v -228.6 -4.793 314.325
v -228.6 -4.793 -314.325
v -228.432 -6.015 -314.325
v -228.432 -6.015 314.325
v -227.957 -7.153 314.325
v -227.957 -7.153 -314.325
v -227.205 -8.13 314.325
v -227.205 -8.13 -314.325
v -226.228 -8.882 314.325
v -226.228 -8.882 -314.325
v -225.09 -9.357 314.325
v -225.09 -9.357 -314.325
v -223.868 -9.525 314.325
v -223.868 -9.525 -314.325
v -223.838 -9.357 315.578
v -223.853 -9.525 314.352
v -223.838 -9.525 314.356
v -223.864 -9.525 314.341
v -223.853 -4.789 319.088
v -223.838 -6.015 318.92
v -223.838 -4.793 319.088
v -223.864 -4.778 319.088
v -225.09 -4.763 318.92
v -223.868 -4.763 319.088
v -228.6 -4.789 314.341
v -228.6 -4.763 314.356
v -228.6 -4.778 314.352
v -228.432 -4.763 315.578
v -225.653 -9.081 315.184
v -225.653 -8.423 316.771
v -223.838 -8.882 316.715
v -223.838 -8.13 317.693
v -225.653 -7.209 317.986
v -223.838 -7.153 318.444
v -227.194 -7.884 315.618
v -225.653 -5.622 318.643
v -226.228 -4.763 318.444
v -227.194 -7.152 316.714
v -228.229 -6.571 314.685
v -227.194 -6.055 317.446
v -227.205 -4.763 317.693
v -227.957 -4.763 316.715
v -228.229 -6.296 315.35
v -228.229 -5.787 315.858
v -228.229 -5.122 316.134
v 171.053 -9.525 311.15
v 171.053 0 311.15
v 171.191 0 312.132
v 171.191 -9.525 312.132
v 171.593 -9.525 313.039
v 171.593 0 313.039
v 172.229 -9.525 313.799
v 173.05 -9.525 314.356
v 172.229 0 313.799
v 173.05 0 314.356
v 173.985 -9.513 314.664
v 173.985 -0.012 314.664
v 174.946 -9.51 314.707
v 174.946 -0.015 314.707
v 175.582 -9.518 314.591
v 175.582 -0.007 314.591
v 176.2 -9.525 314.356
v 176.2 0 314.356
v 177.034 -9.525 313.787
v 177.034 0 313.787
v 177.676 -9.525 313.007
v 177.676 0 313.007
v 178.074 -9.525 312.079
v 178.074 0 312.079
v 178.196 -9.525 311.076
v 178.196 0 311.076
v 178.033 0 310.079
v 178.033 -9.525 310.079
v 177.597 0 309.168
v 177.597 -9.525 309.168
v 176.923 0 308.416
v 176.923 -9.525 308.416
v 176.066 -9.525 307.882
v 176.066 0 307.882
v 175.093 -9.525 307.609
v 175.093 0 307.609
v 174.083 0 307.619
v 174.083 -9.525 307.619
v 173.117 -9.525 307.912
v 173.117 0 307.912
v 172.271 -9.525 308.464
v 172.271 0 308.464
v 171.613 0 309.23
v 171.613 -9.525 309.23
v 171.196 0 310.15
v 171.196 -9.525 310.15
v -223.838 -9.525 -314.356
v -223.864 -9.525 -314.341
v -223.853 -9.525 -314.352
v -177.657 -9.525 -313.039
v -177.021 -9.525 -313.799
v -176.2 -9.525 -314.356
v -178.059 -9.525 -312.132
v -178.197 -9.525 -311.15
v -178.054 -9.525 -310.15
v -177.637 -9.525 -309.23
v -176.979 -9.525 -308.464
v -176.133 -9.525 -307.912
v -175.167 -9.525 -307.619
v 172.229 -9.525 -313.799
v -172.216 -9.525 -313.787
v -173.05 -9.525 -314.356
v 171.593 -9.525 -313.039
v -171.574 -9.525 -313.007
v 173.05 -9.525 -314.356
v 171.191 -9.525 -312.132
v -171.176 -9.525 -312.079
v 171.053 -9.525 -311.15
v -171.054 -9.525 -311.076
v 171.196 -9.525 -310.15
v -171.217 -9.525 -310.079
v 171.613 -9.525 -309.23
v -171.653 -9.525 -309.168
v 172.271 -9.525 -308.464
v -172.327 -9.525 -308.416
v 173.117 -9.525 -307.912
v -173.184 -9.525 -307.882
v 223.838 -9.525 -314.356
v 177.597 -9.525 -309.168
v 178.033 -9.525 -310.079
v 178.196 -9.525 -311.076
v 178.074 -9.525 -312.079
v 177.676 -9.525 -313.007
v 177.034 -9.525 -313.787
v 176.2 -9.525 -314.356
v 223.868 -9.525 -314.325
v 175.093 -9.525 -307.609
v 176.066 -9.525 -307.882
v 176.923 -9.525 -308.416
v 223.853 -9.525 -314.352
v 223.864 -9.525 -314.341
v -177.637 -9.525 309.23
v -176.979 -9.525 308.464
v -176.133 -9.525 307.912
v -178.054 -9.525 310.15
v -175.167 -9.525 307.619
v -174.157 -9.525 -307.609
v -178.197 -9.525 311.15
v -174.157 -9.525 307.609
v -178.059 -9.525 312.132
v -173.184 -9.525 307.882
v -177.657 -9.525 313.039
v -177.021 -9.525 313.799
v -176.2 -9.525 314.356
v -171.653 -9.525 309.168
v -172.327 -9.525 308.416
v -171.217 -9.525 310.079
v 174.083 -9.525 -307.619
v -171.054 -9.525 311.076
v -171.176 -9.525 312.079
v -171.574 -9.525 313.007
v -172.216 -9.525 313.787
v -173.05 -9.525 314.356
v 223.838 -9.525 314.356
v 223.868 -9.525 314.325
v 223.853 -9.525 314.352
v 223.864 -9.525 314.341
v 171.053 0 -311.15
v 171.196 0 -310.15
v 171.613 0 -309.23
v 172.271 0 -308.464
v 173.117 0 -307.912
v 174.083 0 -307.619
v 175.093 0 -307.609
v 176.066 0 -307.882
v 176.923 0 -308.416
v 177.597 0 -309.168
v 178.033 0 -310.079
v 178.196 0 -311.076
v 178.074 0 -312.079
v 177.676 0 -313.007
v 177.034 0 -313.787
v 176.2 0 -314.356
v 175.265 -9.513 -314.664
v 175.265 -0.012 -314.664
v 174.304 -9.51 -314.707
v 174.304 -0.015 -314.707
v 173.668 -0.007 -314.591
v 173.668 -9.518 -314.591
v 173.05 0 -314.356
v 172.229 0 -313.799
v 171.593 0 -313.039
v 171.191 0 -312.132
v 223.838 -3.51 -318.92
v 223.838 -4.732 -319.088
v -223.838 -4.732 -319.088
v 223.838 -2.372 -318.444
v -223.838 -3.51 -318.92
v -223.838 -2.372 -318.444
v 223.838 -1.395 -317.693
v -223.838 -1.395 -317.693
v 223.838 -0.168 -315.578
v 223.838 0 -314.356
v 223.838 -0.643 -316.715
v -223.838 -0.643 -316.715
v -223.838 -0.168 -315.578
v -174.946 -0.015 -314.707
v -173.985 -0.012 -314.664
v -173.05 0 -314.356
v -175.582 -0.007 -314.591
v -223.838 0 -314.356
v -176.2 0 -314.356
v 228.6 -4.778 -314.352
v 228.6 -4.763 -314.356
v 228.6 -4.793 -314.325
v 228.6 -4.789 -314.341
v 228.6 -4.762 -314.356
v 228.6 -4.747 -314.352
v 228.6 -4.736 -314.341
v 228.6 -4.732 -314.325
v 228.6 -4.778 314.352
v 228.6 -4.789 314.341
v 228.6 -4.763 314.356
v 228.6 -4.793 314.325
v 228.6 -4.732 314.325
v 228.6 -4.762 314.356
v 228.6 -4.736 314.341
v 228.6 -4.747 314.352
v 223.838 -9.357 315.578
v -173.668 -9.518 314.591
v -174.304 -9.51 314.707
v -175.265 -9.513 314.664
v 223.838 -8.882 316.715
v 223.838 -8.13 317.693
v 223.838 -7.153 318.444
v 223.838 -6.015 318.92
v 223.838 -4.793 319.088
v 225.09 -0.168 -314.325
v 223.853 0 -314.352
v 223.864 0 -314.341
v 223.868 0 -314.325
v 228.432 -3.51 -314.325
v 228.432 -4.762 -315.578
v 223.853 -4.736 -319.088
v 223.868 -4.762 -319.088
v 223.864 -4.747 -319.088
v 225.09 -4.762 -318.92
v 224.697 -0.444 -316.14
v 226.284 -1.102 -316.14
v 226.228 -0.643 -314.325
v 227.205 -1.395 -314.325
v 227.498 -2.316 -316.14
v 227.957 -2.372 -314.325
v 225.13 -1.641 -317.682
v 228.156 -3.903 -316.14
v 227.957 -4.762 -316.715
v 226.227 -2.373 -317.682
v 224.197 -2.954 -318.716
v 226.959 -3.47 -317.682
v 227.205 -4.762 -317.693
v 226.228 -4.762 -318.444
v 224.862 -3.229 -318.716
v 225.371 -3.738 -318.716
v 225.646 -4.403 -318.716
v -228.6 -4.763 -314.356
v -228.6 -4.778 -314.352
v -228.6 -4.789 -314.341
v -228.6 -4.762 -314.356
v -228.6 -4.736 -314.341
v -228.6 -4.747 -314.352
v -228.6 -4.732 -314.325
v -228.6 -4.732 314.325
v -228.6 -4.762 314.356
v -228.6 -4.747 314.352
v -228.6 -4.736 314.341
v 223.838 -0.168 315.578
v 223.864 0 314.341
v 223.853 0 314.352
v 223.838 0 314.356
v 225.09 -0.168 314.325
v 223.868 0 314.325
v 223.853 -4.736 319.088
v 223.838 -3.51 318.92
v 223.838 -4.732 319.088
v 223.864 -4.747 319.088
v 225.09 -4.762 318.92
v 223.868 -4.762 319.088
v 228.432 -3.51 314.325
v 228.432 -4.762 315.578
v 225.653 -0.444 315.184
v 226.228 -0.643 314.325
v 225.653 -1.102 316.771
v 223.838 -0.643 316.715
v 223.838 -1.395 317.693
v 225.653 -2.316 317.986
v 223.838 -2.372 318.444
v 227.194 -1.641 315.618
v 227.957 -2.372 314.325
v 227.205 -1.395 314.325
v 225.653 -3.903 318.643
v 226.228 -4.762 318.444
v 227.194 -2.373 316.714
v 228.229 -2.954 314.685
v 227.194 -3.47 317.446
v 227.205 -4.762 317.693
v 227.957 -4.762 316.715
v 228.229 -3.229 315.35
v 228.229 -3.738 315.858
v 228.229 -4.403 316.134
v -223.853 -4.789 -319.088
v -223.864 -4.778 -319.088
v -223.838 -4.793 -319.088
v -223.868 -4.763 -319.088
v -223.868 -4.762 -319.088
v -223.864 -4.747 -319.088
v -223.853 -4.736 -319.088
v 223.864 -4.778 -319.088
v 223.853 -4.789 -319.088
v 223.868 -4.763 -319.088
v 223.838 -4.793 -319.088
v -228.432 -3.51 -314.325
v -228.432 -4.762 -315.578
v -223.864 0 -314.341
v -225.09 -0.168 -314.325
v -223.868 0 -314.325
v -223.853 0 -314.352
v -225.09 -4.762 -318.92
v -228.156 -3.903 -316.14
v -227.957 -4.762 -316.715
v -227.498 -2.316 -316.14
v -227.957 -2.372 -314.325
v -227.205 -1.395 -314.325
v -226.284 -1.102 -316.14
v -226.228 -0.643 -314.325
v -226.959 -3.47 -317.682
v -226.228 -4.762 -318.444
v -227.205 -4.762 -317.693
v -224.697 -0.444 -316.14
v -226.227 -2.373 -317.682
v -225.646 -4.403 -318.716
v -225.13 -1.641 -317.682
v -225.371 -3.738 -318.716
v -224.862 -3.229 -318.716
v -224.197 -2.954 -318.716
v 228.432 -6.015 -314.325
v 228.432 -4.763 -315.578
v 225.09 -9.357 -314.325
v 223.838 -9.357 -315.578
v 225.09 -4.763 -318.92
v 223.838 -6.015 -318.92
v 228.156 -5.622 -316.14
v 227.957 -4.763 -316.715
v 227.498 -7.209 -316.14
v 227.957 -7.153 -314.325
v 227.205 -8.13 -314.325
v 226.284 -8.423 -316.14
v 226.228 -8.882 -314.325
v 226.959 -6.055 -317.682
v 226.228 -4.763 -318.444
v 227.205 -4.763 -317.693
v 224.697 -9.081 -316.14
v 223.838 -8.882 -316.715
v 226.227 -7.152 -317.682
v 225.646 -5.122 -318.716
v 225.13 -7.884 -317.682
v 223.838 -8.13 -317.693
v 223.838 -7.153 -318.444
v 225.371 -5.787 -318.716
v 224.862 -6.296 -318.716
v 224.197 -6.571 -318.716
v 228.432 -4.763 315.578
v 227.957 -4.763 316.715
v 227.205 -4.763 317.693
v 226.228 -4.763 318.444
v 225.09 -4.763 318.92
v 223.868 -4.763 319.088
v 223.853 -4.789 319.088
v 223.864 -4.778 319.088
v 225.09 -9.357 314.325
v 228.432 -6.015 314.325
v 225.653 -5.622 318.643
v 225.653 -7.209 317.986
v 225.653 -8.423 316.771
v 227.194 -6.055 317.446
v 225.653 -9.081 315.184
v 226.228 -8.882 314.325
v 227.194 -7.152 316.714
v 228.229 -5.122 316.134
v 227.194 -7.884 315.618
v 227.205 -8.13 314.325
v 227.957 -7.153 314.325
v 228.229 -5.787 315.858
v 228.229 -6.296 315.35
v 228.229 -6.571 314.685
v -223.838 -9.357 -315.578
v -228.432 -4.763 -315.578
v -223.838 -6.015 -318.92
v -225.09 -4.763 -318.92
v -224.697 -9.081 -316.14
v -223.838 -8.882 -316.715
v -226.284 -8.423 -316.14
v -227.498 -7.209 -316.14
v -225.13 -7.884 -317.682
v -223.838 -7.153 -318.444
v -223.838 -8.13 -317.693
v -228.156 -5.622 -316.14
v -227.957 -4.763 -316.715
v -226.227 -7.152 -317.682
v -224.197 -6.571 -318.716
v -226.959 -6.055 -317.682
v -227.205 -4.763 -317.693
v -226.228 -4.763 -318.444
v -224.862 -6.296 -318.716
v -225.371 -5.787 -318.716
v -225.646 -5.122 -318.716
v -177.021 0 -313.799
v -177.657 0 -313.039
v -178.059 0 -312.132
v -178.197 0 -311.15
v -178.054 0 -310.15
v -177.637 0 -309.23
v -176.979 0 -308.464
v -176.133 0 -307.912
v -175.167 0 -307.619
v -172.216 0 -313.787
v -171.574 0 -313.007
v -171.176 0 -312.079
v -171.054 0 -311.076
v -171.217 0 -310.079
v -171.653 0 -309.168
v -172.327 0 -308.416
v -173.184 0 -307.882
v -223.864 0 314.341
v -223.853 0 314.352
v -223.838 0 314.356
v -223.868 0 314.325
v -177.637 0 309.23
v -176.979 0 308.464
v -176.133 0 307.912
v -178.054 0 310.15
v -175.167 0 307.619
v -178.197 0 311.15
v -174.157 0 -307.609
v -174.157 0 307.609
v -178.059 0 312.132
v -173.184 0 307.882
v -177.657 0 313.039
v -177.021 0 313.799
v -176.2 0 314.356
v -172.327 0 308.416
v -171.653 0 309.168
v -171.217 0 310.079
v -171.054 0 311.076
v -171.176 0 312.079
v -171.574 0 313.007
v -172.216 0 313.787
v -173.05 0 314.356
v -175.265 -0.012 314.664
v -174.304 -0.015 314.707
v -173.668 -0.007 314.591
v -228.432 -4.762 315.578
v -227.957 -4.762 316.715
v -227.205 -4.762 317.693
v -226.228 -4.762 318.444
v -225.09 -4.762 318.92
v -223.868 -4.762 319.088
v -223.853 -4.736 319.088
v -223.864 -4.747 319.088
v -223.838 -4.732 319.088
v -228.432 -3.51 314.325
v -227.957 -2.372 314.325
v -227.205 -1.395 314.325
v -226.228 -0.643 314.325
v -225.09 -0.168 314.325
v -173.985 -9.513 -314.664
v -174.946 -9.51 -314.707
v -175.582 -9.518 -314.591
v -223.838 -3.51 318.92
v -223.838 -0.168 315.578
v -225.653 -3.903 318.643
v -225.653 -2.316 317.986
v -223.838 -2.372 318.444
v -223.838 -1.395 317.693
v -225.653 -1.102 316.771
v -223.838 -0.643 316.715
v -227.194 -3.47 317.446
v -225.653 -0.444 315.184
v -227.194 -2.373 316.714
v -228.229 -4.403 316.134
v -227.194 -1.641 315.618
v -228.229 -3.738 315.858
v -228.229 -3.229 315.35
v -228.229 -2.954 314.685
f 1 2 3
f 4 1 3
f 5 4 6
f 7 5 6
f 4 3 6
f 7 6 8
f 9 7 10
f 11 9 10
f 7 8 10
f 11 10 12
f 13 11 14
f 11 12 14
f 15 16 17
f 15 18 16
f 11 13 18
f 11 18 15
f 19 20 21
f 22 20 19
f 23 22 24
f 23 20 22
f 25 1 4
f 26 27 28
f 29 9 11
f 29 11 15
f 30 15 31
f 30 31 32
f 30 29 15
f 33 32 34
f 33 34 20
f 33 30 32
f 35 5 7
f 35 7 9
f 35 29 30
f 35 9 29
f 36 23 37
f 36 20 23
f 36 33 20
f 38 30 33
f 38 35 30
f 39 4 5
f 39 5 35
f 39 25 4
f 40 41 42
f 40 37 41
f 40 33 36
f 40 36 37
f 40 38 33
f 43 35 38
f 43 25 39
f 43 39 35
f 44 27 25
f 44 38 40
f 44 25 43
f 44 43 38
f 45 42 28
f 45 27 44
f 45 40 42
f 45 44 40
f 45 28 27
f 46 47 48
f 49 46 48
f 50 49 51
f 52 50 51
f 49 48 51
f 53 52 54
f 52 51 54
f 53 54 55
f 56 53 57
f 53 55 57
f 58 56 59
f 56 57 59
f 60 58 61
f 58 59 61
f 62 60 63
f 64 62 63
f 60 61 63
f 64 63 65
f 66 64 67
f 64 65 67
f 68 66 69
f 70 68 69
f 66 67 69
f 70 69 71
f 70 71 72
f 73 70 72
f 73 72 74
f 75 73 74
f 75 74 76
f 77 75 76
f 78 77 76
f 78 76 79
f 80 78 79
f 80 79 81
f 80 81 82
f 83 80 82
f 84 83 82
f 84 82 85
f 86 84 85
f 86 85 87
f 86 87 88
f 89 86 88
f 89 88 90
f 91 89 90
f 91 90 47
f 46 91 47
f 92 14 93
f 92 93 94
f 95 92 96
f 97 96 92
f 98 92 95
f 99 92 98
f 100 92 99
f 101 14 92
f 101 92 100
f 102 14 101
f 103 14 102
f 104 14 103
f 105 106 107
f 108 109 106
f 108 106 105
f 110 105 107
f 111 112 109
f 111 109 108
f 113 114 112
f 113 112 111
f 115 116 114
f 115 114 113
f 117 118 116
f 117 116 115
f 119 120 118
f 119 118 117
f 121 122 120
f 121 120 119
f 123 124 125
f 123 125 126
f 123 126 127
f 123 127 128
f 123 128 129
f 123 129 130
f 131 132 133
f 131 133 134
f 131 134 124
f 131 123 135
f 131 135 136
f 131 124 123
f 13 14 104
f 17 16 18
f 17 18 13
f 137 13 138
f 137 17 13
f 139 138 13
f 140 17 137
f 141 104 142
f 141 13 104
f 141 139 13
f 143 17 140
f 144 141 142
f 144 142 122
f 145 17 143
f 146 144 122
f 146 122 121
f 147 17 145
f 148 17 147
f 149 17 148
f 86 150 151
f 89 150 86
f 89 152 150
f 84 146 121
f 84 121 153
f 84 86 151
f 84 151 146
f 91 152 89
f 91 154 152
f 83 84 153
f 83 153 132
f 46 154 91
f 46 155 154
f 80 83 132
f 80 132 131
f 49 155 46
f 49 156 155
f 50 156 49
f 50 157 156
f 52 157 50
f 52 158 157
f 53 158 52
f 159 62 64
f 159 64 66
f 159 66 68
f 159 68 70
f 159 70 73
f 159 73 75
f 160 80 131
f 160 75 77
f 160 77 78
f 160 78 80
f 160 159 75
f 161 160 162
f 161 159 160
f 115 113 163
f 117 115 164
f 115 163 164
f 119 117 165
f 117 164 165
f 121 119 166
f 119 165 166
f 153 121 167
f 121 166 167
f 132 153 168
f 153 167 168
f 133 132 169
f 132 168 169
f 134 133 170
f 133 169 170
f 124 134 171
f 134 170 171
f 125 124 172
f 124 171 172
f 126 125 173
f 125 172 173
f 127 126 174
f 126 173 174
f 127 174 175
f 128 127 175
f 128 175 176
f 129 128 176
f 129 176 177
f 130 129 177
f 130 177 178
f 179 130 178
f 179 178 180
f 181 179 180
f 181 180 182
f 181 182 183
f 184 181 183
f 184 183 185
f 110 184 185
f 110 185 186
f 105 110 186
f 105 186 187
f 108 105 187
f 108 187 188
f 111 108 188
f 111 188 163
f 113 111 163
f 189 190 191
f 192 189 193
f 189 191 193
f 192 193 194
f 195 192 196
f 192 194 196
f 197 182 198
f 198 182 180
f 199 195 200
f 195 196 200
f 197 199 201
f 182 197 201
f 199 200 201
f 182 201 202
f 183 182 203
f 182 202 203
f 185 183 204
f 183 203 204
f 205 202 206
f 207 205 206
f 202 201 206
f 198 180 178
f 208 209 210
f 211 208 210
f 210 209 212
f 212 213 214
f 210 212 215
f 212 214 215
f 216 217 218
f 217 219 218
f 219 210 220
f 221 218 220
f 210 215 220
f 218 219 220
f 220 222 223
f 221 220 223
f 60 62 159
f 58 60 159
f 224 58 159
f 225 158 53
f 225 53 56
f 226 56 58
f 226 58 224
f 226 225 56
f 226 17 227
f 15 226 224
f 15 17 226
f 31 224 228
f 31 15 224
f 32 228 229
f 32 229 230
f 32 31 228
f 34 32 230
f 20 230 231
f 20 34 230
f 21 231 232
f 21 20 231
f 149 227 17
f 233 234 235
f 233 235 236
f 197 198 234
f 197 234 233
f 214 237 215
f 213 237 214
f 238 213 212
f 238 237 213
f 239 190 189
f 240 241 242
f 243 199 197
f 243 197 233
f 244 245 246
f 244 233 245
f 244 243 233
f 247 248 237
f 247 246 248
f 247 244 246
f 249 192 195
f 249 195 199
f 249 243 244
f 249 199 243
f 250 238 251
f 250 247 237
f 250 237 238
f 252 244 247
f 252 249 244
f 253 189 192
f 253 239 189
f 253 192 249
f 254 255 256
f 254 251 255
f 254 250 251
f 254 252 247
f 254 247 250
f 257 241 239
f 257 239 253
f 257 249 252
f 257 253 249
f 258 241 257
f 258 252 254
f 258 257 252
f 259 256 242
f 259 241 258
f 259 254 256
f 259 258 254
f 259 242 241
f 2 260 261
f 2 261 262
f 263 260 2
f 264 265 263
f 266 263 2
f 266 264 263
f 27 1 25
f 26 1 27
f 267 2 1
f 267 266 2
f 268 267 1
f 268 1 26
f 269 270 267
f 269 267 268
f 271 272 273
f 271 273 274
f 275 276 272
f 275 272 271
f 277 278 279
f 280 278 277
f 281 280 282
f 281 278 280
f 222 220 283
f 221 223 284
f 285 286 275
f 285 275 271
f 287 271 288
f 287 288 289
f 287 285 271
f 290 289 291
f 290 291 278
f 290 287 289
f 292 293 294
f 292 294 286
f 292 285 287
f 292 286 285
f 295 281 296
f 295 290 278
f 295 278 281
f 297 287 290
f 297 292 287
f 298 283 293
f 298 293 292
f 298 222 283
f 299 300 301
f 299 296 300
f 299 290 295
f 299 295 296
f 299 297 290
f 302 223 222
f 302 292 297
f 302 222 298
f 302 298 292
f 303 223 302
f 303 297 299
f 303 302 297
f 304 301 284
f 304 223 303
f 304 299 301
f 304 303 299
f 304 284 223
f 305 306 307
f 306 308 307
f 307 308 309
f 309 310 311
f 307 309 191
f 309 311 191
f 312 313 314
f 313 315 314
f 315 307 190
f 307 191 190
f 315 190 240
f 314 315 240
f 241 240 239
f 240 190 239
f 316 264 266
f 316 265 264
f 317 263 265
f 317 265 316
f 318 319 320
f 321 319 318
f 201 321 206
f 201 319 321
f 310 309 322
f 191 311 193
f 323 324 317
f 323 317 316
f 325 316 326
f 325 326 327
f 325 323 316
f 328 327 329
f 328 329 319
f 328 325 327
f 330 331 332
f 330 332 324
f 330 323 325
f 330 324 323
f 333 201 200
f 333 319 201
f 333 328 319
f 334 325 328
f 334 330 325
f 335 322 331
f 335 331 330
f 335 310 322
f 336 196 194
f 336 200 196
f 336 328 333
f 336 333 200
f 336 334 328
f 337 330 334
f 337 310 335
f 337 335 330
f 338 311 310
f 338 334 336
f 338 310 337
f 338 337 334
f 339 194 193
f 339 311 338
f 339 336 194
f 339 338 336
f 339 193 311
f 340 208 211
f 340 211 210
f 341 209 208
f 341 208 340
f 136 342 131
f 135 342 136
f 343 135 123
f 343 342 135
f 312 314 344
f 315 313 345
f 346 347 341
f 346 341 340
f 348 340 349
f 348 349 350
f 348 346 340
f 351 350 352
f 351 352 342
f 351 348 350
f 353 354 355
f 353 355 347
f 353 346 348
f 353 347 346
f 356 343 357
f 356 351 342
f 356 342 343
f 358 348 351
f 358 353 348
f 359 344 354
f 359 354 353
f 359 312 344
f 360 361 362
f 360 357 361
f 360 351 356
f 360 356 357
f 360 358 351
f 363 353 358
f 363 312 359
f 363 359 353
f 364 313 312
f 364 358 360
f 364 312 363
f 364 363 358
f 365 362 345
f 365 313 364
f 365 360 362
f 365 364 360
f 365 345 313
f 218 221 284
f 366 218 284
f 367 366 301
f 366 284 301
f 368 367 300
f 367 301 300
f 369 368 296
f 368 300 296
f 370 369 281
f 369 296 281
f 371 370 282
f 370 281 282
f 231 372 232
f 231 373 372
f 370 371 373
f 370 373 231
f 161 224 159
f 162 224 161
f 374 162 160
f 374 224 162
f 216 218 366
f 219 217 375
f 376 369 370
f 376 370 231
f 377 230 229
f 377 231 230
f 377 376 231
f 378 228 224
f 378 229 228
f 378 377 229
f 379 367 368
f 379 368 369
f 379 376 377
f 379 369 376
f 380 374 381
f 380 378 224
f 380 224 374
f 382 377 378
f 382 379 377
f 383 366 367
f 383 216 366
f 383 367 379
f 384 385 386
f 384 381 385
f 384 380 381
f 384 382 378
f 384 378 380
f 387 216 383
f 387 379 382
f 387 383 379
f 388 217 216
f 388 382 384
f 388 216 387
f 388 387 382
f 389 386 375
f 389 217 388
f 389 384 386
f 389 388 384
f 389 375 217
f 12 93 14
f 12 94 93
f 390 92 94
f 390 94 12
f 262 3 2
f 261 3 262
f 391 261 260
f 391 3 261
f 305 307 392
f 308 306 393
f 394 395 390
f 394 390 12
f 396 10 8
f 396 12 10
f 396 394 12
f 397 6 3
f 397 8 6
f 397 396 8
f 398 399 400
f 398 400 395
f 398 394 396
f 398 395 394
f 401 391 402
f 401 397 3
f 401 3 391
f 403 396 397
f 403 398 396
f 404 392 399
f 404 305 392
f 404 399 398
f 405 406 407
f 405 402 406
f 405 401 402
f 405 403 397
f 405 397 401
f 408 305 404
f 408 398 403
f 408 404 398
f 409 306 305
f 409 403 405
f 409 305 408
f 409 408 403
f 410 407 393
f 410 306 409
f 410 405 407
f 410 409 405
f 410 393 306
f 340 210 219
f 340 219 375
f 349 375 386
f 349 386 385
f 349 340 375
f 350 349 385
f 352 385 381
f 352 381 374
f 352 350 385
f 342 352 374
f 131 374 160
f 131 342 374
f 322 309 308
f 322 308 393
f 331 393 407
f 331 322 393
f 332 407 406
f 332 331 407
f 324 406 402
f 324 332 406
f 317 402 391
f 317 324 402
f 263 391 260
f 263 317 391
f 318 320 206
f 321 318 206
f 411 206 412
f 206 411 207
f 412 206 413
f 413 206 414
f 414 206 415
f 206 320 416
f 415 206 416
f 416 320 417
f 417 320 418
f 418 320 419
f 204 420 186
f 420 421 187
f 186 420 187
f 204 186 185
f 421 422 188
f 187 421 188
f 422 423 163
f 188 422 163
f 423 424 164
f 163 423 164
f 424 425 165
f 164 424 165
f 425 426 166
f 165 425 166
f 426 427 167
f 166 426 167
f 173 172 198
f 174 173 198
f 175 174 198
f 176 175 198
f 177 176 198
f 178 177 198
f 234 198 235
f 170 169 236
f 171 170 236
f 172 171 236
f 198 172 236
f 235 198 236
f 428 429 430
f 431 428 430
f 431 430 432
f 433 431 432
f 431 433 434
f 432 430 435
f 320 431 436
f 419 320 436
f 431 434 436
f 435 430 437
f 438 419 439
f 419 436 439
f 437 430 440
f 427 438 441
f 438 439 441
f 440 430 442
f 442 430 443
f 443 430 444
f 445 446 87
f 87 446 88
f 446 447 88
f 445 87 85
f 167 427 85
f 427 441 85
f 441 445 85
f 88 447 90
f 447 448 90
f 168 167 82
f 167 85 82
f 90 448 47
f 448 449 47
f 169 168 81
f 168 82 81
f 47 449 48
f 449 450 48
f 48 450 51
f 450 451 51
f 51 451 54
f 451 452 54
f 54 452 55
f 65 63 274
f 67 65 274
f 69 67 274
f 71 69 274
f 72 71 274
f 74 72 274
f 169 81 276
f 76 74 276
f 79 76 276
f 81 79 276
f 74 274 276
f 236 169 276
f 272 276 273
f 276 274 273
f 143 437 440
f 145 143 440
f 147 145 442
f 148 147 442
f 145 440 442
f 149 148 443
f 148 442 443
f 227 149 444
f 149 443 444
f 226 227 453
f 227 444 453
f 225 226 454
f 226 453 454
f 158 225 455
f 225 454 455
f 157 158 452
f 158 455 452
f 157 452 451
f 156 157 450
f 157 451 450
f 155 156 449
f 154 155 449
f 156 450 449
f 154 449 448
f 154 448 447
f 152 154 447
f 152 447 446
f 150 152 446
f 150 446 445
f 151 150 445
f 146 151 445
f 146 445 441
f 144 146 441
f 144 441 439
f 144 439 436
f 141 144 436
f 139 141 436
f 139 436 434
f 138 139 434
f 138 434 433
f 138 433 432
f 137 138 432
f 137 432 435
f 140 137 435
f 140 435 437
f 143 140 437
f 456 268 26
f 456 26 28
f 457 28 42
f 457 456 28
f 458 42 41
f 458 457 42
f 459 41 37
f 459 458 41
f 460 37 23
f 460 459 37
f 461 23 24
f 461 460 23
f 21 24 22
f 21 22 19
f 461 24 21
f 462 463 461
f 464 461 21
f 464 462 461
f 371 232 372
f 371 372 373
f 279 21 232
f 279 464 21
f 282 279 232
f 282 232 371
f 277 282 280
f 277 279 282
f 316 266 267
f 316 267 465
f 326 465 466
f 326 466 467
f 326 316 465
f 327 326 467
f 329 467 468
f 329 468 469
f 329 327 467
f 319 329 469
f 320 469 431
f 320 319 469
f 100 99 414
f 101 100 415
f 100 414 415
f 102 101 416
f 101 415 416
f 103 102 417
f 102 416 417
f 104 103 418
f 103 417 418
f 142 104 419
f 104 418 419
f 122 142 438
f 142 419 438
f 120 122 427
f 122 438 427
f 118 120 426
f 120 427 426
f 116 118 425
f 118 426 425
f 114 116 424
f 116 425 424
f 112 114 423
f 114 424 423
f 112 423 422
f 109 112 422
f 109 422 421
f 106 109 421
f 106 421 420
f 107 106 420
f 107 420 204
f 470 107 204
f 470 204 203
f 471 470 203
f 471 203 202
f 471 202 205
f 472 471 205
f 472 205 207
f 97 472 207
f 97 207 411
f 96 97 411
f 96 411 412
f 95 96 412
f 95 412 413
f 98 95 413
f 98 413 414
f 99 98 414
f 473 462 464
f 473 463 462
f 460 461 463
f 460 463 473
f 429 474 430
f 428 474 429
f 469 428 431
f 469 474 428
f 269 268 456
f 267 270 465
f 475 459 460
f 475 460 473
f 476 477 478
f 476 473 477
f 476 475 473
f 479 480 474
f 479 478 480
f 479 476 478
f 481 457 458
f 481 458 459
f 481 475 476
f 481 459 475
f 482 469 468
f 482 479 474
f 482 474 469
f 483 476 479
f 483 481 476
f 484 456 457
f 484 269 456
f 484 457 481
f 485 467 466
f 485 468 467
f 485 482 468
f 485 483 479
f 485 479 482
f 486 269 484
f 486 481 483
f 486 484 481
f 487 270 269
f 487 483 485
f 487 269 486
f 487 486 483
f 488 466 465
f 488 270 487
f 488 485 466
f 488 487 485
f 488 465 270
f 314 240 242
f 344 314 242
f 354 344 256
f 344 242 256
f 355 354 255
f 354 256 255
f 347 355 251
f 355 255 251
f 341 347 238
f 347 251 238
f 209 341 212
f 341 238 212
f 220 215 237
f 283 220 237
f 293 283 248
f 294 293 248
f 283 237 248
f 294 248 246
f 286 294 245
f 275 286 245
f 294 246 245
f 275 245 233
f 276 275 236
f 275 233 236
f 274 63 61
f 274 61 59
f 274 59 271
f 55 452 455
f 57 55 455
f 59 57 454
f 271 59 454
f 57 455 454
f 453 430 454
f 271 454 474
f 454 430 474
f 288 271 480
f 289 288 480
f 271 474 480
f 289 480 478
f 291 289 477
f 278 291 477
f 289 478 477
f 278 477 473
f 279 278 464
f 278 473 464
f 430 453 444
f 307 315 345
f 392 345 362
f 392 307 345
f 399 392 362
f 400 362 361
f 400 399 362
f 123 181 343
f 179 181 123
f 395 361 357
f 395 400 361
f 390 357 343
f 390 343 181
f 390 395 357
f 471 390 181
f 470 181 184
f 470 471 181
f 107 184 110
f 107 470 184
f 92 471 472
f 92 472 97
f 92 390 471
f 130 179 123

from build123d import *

# Parameters (mm, degrees)
F0_W         = 457.2
F0_H         = 638.175
F1_DEPTH     = 9.525
F3_D         = 7.14375
F4_T1_DEPTH  = 628.6502
F4_T3_DEPTH  = 447.6752
F4_T5_DEPTH  = 0.0002
F4_S9_W      = 4.85775
F4_S9_H      = 4.85775
F4_T10_DEPTH = 4.85775
F4_S15_W     = 4.85775
F4_S15_H     = 4.85775
F4_T16_DEPTH = 4.85775
F4_S21_W     = 4.85775
F4_S21_H     = 4.85775
F4_T22_DEPTH = 4.85775
F4_S27_W     = 4.85775
F4_S27_H     = 4.85775
F4_T28_DEPTH = 4.85775
F4_S33_W     = 4.85775
F4_S33_H     = 4.85775
F4_T34_DEPTH = 4.85775
F4_S39_W     = 4.85775
F4_S39_H     = 4.85775
F4_T40_DEPTH = 4.85775
F4_S45_W     = 4.85775
F4_S45_H     = 4.85775
F4_T46_DEPTH = 4.85775
F4_S51_W     = 4.85775
F4_S51_H     = 4.85775
F4_T52_DEPTH = 4.85775


# Not quite as in the source:
# - a fillet or chamfer that OpenCascade refuses, or shapes differently, is made with other operations: its cross-section is extruded or revolved along the edge and cut away or added


with BuildPart() as f1:
    # F0 (on Front) → F1 (new body)
    with BuildSketch(Plane.XZ):
        Rectangle(F0_W, F0_H)
    extrude(amount=F1_DEPTH)

    # F3 (through all)
    with Locations(Plane.XZ.offset(9.525)):
        with Locations((-174.625, 311.15), (174.625, 311.15), (-174.625, -311.15), (174.625, -311.15)):
            Hole(F3_D / 2)

    # F4: fillet of radius 4.7625 on 12 edges, made by hand

    # F4_s2 → F4_t1 (cut)
    with BuildSketch(Plane.XY.offset(-314.3251)):
        with BuildLine():
            ThreePointArc((-228.6001, -4.7626), (-227.2051960454, -8.1301960454), (-223.8376, -9.5251))
            Line((-223.8376, -9.5251), (-223.8376, -9.62035))
            ThreePointArc((-223.8376, -9.62035), (-226.2188, -9.62025), (-228.6, -9.62025))
            Line((-228.6, -9.62025), (-228.69525, -9.525))
            ThreePointArc((-228.69525, -9.525), (-228.69525, -7.1438), (-228.69535, -4.7626))
            Line((-228.69535, -4.7626), (-228.6001, -4.7626))
        make_face()
        with BuildLine():
            ThreePointArc((228.6001, -4.7626), (227.2051960454, -8.1301960454), (223.8376, -9.5251))
            Line((223.8376, -9.5251), (223.8376, -9.62035))
            ThreePointArc((223.8376, -9.62035), (226.2188, -9.62025), (228.6, -9.62025))
            Line((228.6, -9.62025), (228.69525, -9.525))
            ThreePointArc((228.69525, -9.525), (228.69525, -7.1438), (228.69535, -4.7626))
            Line((228.69535, -4.7626), (228.6001, -4.7626))
        make_face()
        with BuildLine():
            ThreePointArc((228.6001, -4.7624), (227.2051960454, -1.3948039546), (223.8376, 0.0001))
            Line((223.8376, 0.0001), (223.8376, 0.09535))
            ThreePointArc((223.8376, 0.09535), (226.2188, 0.09525), (228.6, 0.09525))
            Line((228.6, 0.09525), (228.69525, 0))
            ThreePointArc((228.69525, 0), (228.69525, -2.3812), (228.69535, -4.7624))
            Line((228.69535, -4.7624), (228.6001, -4.7624))
        make_face()
        with BuildLine():
            ThreePointArc((-228.6001, -4.7624), (-227.2051960454, -1.3948039546), (-223.8376, 0.0001))
            Line((-223.8376, 0.0001), (-223.8376, 0.09535))
            ThreePointArc((-223.8376, 0.09535), (-226.2188, 0.09525), (-228.6, 0.09525))
            Line((-228.6, 0.09525), (-228.69525, 0))
            ThreePointArc((-228.69525, 0), (-228.69525, -2.3812), (-228.69535, -4.7624))
            Line((-228.69535, -4.7624), (-228.6001, -4.7624))
        make_face()
    extrude(amount=F4_T1_DEPTH, mode=Mode.SUBTRACT)

    # F4_s4 → F4_t3 (cut)
    with BuildSketch(Plane.YZ.offset(-223.8376)):
        with BuildLine():
            ThreePointArc((-4.7626, -319.0876), (-8.1301960454, -317.6926960454), (-9.5251, -314.3251))
            Line((-9.5251, -314.3251), (-9.62035, -314.3251))
            ThreePointArc((-9.62035, -314.3251), (-9.62025, -316.7063), (-9.62025, -319.0875))
            Line((-9.62025, -319.0875), (-9.525, -319.18275))
            ThreePointArc((-9.525, -319.18275), (-7.1438, -319.18275), (-4.7626, -319.18285))
            Line((-4.7626, -319.18285), (-4.7626, -319.0876))
        make_face()
        with BuildLine():
            ThreePointArc((-9.5251, 314.3251), (-8.1301960454, 317.6926960454), (-4.7626, 319.0876))
            Line((-4.7626, 319.0876), (-4.7626, 319.18285))
            ThreePointArc((-4.7626, 319.18285), (-7.1438, 319.18275), (-9.525, 319.18275))
            Line((-9.525, 319.18275), (-9.62025, 319.0875))
            ThreePointArc((-9.62025, 319.0875), (-9.62025, 316.7063), (-9.62035, 314.3251))
            Line((-9.62035, 314.3251), (-9.5251, 314.3251))
        make_face()
        with BuildLine():
            ThreePointArc((0.0001, 314.3251), (-1.3948039546, 317.6926960454), (-4.7624, 319.0876))
            Line((-4.7624, 319.0876), (-4.7624, 319.18285))
            ThreePointArc((-4.7624, 319.18285), (-2.3812, 319.18275), (0, 319.18275))
            Line((0, 319.18275), (0.09525, 319.0875))
            ThreePointArc((0.09525, 319.0875), (0.09525, 316.7063), (0.09535, 314.3251))
            Line((0.09535, 314.3251), (0.0001, 314.3251))
        make_face()
        with BuildLine():
            ThreePointArc((-4.7624, -319.0876), (-1.3948039546, -317.6926960454), (0.0001, -314.3251))
            Line((0.0001, -314.3251), (0.09535, -314.3251))
            ThreePointArc((0.09535, -314.3251), (0.09525, -316.7063), (0.09525, -319.0875))
            Line((0.09525, -319.0875), (0, -319.18275))
            ThreePointArc((0, -319.18275), (-2.3812, -319.18275), (-4.7624, -319.18285))
            Line((-4.7624, -319.18285), (-4.7624, -319.0876))
        make_face()
    extrude(amount=F4_T3_DEPTH, mode=Mode.SUBTRACT)

    # F4_s6 → F4_t5 (cut)
    with BuildSketch(Plane.XZ.offset(4.7624)):
        with BuildLine():
            ThreePointArc((-223.8376, -319.0876), (-227.2051960454, -317.6926960454), (-228.6001, -314.3251))
            Line((-228.6001, -314.3251), (-228.69535, -314.3251))
            ThreePointArc((-228.69535, -314.3251), (-228.69525, -316.7063), (-228.69525, -319.0875))
            Line((-228.69525, -319.0875), (-228.6, -319.18275))
            ThreePointArc((-228.6, -319.18275), (-226.2188, -319.18275), (-223.8376, -319.18285))
            Line((-223.8376, -319.18285), (-223.8376, -319.0876))
        make_face()
        with BuildLine():
            ThreePointArc((223.8376, -319.0876), (227.2051960454, -317.6926960454), (228.6001, -314.3251))
            Line((228.6001, -314.3251), (228.69535, -314.3251))
            ThreePointArc((228.69535, -314.3251), (228.69525, -316.7063), (228.69525, -319.0875))
            Line((228.69525, -319.0875), (228.6, -319.18275))
            ThreePointArc((228.6, -319.18275), (226.2188, -319.18275), (223.8376, -319.18285))
            Line((223.8376, -319.18285), (223.8376, -319.0876))
        make_face()
        with BuildLine():
            ThreePointArc((228.6001, 314.3251), (227.2051960454, 317.6926960454), (223.8376, 319.0876))
            Line((223.8376, 319.0876), (223.8376, 319.18285))
            ThreePointArc((223.8376, 319.18285), (226.2188, 319.18275), (228.6, 319.18275))
            Line((228.6, 319.18275), (228.69525, 319.0875))
            ThreePointArc((228.69525, 319.0875), (228.69525, 316.7063), (228.69535, 314.3251))
            Line((228.69535, 314.3251), (228.6001, 314.3251))
        make_face()
        with BuildLine():
            ThreePointArc((-228.6001, 314.3251), (-227.2051960454, 317.6926960454), (-223.8376, 319.0876))
            Line((-223.8376, 319.0876), (-223.8376, 319.18285))
            ThreePointArc((-223.8376, 319.18285), (-226.2188, 319.18275), (-228.6, 319.18275))
            Line((-228.6, 319.18275), (-228.69525, 319.0875))
            ThreePointArc((-228.69525, 319.0875), (-228.69525, 316.7063), (-228.69535, 314.3251))
            Line((-228.69535, 314.3251), (-228.6001, 314.3251))
        make_face()
    extrude(amount=F4_T5_DEPTH, mode=Mode.SUBTRACT)


with BuildPart() as f4_tool8:
    # F4_s9 → F4_t10 (new body)
    with BuildSketch(Plane.YZ.offset(-223.8376)):
        with Locations((-7.191475, 316.753975)):
            Rectangle(F4_S9_W, F4_S9_H)
    extrude(amount=-F4_T10_DEPTH)

    # F4_s11 → F4_t12 (revolve, cut)
    with BuildSketch(Plane(origin=(-223.8376, -4.7626, 314.3251), x_dir=(0, 0.7071067812, -0.7071067812), z_dir=(0, 0.7071067812, 0.7071067812))):
        with BuildLine():
            ThreePointArc((0, -4.7625), (4.7625, 0), (0, 4.7625))
            Line((0, 4.7625), (0, -4.7625))
        make_face()
    revolve(axis=Axis((-223.8376, -4.7626, 314.3251), (-1, 0, 0)), mode=Mode.SUBTRACT)


with BuildPart() as f1_1:
    add(f1.part)

    # F4_t7: cut F4_tool8
    add(f4_tool8.part, mode=Mode.SUBTRACT)


with BuildPart() as f4_tool14:
    # F4_s15 → F4_t16 (new body)
    with BuildSketch(Plane.XY.offset(-314.3251)):
        with Locations((-226.266475, -7.191475)):
            Rectangle(F4_S15_W, F4_S15_H)
    extrude(amount=-F4_T16_DEPTH)

    # F4_s17 → F4_t18 (revolve, cut)
    with BuildSketch(Plane(origin=(-223.8376, -4.7626, -314.3251), x_dir=(0.7071067812, 0.7071067812, 0), z_dir=(-0.7071067812, 0.7071067812, 0))):
        with BuildLine():
            ThreePointArc((0, -4.7625), (4.7625, 0), (0, 4.7625))
            Line((0, 4.7625), (0, -4.7625))
        make_face()
    revolve(axis=Axis((-223.8376, -4.7626, -314.3251), (0, 0, -1)), mode=Mode.SUBTRACT)


with BuildPart() as f1_2:
    add(f1_1.part)

    # F4_t13: cut F4_tool14
    add(f4_tool14.part, mode=Mode.SUBTRACT)


with BuildPart() as f4_tool20:
    # F4_s21 → F4_t22 (new body)
    with BuildSketch(Plane.XY.offset(-314.3251)):
        with Locations((226.266475, -7.191475)):
            Rectangle(F4_S21_W, F4_S21_H)
    extrude(amount=-F4_T22_DEPTH)

    # F4_s23 → F4_t24 (revolve, cut)
    with BuildSketch(Plane(origin=(223.8376, -4.7626, -314.3251), x_dir=(-0.7071067812, 0.7071067812, 0), z_dir=(-0.7071067812, -0.7071067812, 0))):
        with BuildLine():
            ThreePointArc((0, -4.7625), (4.7625, 0), (0, 4.7625))
            Line((0, 4.7625), (0, -4.7625))
        make_face()
    revolve(axis=Axis((223.8376, -4.7626, -314.3251), (0, 0, -1)), mode=Mode.SUBTRACT)


with BuildPart() as f1_3:
    add(f1_2.part)

    # F4_t19: cut F4_tool20
    add(f4_tool20.part, mode=Mode.SUBTRACT)


with BuildPart() as f4_tool26:
    # F4_s27 → F4_t28 (new body)
    with BuildSketch(Plane.YZ.offset(223.8376)):
        with Locations((-7.191475, 316.753975)):
            Rectangle(F4_S27_W, F4_S27_H)
    extrude(amount=F4_T28_DEPTH)

    # F4_s29 → F4_t30 (revolve, cut)
    with BuildSketch(Plane(origin=(223.8376, -4.7626, 314.3251), x_dir=(0, 0.7071067812, -0.7071067812), z_dir=(0, -0.7071067812, -0.7071067812))):
        with BuildLine():
            ThreePointArc((0, -4.7625), (4.7625, 0), (0, 4.7625))
            Line((0, 4.7625), (0, -4.7625))
        make_face()
    revolve(axis=Axis((223.8376, -4.7626, 314.3251), (1, 0, 0)), mode=Mode.SUBTRACT)


with BuildPart() as f1_4:
    add(f1_3.part)

    # F4_t25: cut F4_tool26
    add(f4_tool26.part, mode=Mode.SUBTRACT)


with BuildPart() as f4_tool32:
    # F4_s33 → F4_t34 (new body)
    with BuildSketch(Plane.XY.offset(-314.3251)):
        with Locations((226.266475, -2.333525)):
            Rectangle(F4_S33_W, F4_S33_H)
    extrude(amount=-F4_T34_DEPTH)

    # F4_s35 → F4_t36 (revolve, cut)
    with BuildSketch(Plane(origin=(223.8376, -4.7624, -314.3251), x_dir=(-0.7071067812, -0.7071067812, 0), z_dir=(0.7071067812, -0.7071067812, 0))):
        with BuildLine():
            ThreePointArc((0, -4.7625), (4.7625, 0), (0, 4.7625))
            Line((0, 4.7625), (0, -4.7625))
        make_face()
    revolve(axis=Axis((223.8376, -4.7624, -314.3251), (0, 0, -1)), mode=Mode.SUBTRACT)


with BuildPart() as f1_5:
    add(f1_4.part)

    # F4_t31: cut F4_tool32
    add(f4_tool32.part, mode=Mode.SUBTRACT)


with BuildPart() as f4_tool38:
    # F4_s39 → F4_t40 (new body)
    with BuildSketch(Plane.YZ.offset(223.8376)):
        with Locations((-2.333525, 316.753975)):
            Rectangle(F4_S39_W, F4_S39_H)
    extrude(amount=F4_T40_DEPTH)

    # F4_s41 → F4_t42 (revolve, cut)
    with BuildSketch(Plane(origin=(223.8376, -4.7624, 314.3251), x_dir=(0, -0.7071067812, -0.7071067812), z_dir=(0, -0.7071067812, 0.7071067812))):
        with BuildLine():
            ThreePointArc((0, -4.7625), (4.7625, 0), (0, 4.7625))
            Line((0, 4.7625), (0, -4.7625))
        make_face()
    revolve(axis=Axis((223.8376, -4.7624, 314.3251), (1, 0, 0)), mode=Mode.SUBTRACT)


with BuildPart() as f1_6:
    add(f1_5.part)

    # F4_t37: cut F4_tool38
    add(f4_tool38.part, mode=Mode.SUBTRACT)


with BuildPart() as f4_tool44:
    # F4_s45 → F4_t46 (new body)
    with BuildSketch(Plane.YZ.offset(-223.8376)):
        with Locations((-2.333525, 316.753975)):
            Rectangle(F4_S45_W, F4_S45_H)
    extrude(amount=-F4_T46_DEPTH)

    # F4_s47 → F4_t48 (revolve, cut)
    with BuildSketch(Plane(origin=(-223.8376, -4.7624, 314.3251), x_dir=(0, -0.7071067812, -0.7071067812), z_dir=(0, 0.7071067812, -0.7071067812))):
        with BuildLine():
            ThreePointArc((0, -4.7625), (4.7625, 0), (0, 4.7625))
            Line((0, 4.7625), (0, -4.7625))
        make_face()
    revolve(axis=Axis((-223.8376, -4.7624, 314.3251), (-1, 0, 0)), mode=Mode.SUBTRACT)


with BuildPart() as f1_7:
    add(f1_6.part)

    # F4_t43: cut F4_tool44
    add(f4_tool44.part, mode=Mode.SUBTRACT)


with BuildPart() as f4_tool50:
    # F4_s51 → F4_t52 (new body)
    with BuildSketch(Plane.XY.offset(-314.3251)):
        with Locations((-226.266475, -2.333525)):
            Rectangle(F4_S51_W, F4_S51_H)
    extrude(amount=-F4_T52_DEPTH)

    # F4_s53 → F4_t54 (revolve, cut)
    with BuildSketch(Plane(origin=(-223.8376, -4.7624, -314.3251), x_dir=(0.7071067812, -0.7071067812, 0), z_dir=(0.7071067812, 0.7071067812, 0))):
        with BuildLine():
            ThreePointArc((0, -4.7625), (4.7625, 0), (0, 4.7625))
            Line((0, 4.7625), (0, -4.7625))
        make_face()
    revolve(axis=Axis((-223.8376, -4.7624, -314.3251), (0, 0, -1)), mode=Mode.SUBTRACT)


with BuildPart() as f1_8:
    add(f1_7.part)

    # F4_t49: cut F4_tool50
    add(f4_tool50.part, mode=Mode.SUBTRACT)


solid = f1_8.part
